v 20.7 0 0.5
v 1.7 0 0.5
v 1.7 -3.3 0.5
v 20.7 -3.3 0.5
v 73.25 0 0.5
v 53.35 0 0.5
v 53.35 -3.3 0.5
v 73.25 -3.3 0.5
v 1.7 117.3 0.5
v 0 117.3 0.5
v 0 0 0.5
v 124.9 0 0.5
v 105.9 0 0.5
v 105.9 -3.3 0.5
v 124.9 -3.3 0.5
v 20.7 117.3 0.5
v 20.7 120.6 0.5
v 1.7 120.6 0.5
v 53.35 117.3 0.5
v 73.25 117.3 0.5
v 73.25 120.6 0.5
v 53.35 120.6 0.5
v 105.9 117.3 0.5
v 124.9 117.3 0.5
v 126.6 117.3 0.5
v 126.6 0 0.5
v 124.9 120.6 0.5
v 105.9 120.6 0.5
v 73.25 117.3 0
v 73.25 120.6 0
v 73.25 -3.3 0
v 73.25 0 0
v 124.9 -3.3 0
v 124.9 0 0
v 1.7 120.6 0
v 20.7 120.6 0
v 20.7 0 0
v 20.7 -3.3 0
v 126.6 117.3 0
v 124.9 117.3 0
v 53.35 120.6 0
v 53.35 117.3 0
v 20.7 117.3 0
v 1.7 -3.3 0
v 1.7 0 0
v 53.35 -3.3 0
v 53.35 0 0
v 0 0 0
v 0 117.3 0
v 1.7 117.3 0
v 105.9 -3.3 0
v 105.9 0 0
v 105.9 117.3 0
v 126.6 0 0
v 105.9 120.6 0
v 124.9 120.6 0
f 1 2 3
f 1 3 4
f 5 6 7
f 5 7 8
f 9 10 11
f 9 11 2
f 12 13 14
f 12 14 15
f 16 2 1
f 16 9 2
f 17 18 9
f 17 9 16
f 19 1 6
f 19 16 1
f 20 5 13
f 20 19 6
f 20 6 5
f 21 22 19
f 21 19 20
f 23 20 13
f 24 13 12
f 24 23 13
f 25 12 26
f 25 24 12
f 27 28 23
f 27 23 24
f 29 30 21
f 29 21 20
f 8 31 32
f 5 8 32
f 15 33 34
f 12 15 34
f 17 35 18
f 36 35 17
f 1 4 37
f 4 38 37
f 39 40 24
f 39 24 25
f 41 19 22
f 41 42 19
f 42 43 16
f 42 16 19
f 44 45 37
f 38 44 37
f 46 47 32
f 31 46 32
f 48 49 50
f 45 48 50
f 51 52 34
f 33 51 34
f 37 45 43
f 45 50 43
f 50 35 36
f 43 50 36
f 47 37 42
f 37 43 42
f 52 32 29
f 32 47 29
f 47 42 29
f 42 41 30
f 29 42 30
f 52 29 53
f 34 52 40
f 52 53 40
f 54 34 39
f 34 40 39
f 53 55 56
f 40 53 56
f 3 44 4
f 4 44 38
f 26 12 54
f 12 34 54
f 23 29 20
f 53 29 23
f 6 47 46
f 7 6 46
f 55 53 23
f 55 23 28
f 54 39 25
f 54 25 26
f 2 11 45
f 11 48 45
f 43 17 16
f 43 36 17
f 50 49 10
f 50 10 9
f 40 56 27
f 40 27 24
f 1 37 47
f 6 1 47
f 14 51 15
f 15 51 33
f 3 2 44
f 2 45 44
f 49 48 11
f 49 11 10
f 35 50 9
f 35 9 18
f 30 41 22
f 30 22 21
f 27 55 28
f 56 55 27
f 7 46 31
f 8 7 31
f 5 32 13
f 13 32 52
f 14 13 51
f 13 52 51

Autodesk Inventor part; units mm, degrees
ref_plane "YZ Plane" through (0, 0, 0) normal (1, 0, 0) x (0, 1, 0)
ref_plane "XZ Plane" through (0, 0, 0) normal (0, 1, 0) x (-1, 0, 0)
sketch "Sketch1" plane through (0, 0, 0) normal (0, 0, 1) x (1, 0, 0)
  line L0 (0, 0) -> (126.6, 0)
  line L1 (1.7, 0) -> (1.7, -3.3)
  line L2 (1.7, -3.3) -> (20.7, -3.3)
  line L3 (20.7, -3.3) -> (20.7, 0)
  line L4 (53.35, 0) -> (53.35, -3.3)
  line L5 (53.35, -3.3) -> (73.25, -3.3)
  line L6 (73.25, -3.3) -> (73.25, 0)
  line L7 (105.9, 0) -> (105.9, -3.3)
  line L8 (105.9, -3.3) -> (124.9, -3.3)
  line L9 (124.9, -3.3) -> (124.9, 0)
  line L10 (11.2, -3.3) -> (11.2, 0) construction
  line L11 (63.3, -3.3) -> (63.3, 0) construction
  line L12 (115.4, -3.3) -> (115.4, 0) construction
  line L13 (63.3, 0) -> (63.3, 12.1181) construction
  line L14 (0, 0) -> (0, 58.65)
  line L15 (0, 58.65) -> (126.6, 58.65) construction
  line L16 (126.6, 0) -> (126.6, 58.65)
  line L17 (0, 117.3) -> (126.6, 117.3)
  line L18 (1.7, 117.3) -> (1.7, 120.6)
  line L19 (1.7, 120.6) -> (20.7, 120.6)
  line L20 (20.7, 120.6) -> (20.7, 117.3)
  line L21 (53.35, 117.3) -> (53.35, 120.6)
  line L22 (53.35, 120.6) -> (73.25, 120.6)
  line L23 (73.25, 120.6) -> (73.25, 117.3)
  line L24 (105.9, 117.3) -> (105.9, 120.6)
  line L25 (105.9, 120.6) -> (124.9, 120.6)
  line L26 (124.9, 120.6) -> (124.9, 117.3)
  line L27 (11.2, 120.6) -> (11.2, 117.3) construction
  line L28 (63.3, 120.6) -> (63.3, 117.3) construction
  line L29 (115.4, 120.6) -> (115.4, 117.3) construction
  line L30 (63.3, 117.3) -> (63.3, 105.1819) construction
  line L31 (0, 117.3) -> (0, 58.65)
  line L32 (126.6, 117.3) -> (126.6, 58.65)
  dimension "d12" = 126.6
  dimension "d13" = 3.3
  dimension "d14" = 19
  dimension "d15" = 3.3
  dimension "d16" = 19.9
  dimension "d17" = 3.3
  dimension "d18" = 19
  dimension "d19" = 52.1
  dimension "d20" = 52.1
  dimension "d21" = 58.65
extrude "Extrusion1" add sketch "Sketch1" along normal blind 0.5
ref_plane "Work Plane1" through (0, 0, 0.25) normal (0, 0, 1) x (1, 0, 0)
ref_plane "Work Plane2" through (63.3, 0, 0) normal (1, 0, 0) x (0, 0, -1)
equation "\"d12\" = lrltotal"
equation "\"d13\" = lrdepth"
equation "\"d14\" = lrlr"
equation "\"d15\" = lrdepth"
equation "\"d16\" = lrmid"
equation "\"d17\" = lrdepth"
equation "\"d18\" = lrlr"
equation "\"d20\" = d19"
equation "\"d21\" = 0.5 * heaterH"
equation "\"d22\" = thick"
equation "\"thick\" = 0.5"
equation "\"lrlr\" = 19"
equation "\"lrmid\" = 19.9"
equation "\"lrdepth\" = 3.3"
equation "\"mlr\" = 16.6"
equation "\"mmid\" = 24.7"
equation "\"mdepth\" = 4.5"
equation "\"lrltotal\" = 126.6"
equation "\"mltotal\" = 126.6"
equation "\"lrbetween\" = 52.1"
equation "\"mbetween\" = 49.5"
equation "\"toler\" = 1"
equation "\"stuckw\" = 6"
equation "\"tight\" = 0.08"
equation "\"sidewallL\" = 132.6"
equation "\"heaterH\" = 117.3"
equation "\"stickL\" = 3.5"
equation "\"wireH\" = 25"
properties part number "lr_heater"
